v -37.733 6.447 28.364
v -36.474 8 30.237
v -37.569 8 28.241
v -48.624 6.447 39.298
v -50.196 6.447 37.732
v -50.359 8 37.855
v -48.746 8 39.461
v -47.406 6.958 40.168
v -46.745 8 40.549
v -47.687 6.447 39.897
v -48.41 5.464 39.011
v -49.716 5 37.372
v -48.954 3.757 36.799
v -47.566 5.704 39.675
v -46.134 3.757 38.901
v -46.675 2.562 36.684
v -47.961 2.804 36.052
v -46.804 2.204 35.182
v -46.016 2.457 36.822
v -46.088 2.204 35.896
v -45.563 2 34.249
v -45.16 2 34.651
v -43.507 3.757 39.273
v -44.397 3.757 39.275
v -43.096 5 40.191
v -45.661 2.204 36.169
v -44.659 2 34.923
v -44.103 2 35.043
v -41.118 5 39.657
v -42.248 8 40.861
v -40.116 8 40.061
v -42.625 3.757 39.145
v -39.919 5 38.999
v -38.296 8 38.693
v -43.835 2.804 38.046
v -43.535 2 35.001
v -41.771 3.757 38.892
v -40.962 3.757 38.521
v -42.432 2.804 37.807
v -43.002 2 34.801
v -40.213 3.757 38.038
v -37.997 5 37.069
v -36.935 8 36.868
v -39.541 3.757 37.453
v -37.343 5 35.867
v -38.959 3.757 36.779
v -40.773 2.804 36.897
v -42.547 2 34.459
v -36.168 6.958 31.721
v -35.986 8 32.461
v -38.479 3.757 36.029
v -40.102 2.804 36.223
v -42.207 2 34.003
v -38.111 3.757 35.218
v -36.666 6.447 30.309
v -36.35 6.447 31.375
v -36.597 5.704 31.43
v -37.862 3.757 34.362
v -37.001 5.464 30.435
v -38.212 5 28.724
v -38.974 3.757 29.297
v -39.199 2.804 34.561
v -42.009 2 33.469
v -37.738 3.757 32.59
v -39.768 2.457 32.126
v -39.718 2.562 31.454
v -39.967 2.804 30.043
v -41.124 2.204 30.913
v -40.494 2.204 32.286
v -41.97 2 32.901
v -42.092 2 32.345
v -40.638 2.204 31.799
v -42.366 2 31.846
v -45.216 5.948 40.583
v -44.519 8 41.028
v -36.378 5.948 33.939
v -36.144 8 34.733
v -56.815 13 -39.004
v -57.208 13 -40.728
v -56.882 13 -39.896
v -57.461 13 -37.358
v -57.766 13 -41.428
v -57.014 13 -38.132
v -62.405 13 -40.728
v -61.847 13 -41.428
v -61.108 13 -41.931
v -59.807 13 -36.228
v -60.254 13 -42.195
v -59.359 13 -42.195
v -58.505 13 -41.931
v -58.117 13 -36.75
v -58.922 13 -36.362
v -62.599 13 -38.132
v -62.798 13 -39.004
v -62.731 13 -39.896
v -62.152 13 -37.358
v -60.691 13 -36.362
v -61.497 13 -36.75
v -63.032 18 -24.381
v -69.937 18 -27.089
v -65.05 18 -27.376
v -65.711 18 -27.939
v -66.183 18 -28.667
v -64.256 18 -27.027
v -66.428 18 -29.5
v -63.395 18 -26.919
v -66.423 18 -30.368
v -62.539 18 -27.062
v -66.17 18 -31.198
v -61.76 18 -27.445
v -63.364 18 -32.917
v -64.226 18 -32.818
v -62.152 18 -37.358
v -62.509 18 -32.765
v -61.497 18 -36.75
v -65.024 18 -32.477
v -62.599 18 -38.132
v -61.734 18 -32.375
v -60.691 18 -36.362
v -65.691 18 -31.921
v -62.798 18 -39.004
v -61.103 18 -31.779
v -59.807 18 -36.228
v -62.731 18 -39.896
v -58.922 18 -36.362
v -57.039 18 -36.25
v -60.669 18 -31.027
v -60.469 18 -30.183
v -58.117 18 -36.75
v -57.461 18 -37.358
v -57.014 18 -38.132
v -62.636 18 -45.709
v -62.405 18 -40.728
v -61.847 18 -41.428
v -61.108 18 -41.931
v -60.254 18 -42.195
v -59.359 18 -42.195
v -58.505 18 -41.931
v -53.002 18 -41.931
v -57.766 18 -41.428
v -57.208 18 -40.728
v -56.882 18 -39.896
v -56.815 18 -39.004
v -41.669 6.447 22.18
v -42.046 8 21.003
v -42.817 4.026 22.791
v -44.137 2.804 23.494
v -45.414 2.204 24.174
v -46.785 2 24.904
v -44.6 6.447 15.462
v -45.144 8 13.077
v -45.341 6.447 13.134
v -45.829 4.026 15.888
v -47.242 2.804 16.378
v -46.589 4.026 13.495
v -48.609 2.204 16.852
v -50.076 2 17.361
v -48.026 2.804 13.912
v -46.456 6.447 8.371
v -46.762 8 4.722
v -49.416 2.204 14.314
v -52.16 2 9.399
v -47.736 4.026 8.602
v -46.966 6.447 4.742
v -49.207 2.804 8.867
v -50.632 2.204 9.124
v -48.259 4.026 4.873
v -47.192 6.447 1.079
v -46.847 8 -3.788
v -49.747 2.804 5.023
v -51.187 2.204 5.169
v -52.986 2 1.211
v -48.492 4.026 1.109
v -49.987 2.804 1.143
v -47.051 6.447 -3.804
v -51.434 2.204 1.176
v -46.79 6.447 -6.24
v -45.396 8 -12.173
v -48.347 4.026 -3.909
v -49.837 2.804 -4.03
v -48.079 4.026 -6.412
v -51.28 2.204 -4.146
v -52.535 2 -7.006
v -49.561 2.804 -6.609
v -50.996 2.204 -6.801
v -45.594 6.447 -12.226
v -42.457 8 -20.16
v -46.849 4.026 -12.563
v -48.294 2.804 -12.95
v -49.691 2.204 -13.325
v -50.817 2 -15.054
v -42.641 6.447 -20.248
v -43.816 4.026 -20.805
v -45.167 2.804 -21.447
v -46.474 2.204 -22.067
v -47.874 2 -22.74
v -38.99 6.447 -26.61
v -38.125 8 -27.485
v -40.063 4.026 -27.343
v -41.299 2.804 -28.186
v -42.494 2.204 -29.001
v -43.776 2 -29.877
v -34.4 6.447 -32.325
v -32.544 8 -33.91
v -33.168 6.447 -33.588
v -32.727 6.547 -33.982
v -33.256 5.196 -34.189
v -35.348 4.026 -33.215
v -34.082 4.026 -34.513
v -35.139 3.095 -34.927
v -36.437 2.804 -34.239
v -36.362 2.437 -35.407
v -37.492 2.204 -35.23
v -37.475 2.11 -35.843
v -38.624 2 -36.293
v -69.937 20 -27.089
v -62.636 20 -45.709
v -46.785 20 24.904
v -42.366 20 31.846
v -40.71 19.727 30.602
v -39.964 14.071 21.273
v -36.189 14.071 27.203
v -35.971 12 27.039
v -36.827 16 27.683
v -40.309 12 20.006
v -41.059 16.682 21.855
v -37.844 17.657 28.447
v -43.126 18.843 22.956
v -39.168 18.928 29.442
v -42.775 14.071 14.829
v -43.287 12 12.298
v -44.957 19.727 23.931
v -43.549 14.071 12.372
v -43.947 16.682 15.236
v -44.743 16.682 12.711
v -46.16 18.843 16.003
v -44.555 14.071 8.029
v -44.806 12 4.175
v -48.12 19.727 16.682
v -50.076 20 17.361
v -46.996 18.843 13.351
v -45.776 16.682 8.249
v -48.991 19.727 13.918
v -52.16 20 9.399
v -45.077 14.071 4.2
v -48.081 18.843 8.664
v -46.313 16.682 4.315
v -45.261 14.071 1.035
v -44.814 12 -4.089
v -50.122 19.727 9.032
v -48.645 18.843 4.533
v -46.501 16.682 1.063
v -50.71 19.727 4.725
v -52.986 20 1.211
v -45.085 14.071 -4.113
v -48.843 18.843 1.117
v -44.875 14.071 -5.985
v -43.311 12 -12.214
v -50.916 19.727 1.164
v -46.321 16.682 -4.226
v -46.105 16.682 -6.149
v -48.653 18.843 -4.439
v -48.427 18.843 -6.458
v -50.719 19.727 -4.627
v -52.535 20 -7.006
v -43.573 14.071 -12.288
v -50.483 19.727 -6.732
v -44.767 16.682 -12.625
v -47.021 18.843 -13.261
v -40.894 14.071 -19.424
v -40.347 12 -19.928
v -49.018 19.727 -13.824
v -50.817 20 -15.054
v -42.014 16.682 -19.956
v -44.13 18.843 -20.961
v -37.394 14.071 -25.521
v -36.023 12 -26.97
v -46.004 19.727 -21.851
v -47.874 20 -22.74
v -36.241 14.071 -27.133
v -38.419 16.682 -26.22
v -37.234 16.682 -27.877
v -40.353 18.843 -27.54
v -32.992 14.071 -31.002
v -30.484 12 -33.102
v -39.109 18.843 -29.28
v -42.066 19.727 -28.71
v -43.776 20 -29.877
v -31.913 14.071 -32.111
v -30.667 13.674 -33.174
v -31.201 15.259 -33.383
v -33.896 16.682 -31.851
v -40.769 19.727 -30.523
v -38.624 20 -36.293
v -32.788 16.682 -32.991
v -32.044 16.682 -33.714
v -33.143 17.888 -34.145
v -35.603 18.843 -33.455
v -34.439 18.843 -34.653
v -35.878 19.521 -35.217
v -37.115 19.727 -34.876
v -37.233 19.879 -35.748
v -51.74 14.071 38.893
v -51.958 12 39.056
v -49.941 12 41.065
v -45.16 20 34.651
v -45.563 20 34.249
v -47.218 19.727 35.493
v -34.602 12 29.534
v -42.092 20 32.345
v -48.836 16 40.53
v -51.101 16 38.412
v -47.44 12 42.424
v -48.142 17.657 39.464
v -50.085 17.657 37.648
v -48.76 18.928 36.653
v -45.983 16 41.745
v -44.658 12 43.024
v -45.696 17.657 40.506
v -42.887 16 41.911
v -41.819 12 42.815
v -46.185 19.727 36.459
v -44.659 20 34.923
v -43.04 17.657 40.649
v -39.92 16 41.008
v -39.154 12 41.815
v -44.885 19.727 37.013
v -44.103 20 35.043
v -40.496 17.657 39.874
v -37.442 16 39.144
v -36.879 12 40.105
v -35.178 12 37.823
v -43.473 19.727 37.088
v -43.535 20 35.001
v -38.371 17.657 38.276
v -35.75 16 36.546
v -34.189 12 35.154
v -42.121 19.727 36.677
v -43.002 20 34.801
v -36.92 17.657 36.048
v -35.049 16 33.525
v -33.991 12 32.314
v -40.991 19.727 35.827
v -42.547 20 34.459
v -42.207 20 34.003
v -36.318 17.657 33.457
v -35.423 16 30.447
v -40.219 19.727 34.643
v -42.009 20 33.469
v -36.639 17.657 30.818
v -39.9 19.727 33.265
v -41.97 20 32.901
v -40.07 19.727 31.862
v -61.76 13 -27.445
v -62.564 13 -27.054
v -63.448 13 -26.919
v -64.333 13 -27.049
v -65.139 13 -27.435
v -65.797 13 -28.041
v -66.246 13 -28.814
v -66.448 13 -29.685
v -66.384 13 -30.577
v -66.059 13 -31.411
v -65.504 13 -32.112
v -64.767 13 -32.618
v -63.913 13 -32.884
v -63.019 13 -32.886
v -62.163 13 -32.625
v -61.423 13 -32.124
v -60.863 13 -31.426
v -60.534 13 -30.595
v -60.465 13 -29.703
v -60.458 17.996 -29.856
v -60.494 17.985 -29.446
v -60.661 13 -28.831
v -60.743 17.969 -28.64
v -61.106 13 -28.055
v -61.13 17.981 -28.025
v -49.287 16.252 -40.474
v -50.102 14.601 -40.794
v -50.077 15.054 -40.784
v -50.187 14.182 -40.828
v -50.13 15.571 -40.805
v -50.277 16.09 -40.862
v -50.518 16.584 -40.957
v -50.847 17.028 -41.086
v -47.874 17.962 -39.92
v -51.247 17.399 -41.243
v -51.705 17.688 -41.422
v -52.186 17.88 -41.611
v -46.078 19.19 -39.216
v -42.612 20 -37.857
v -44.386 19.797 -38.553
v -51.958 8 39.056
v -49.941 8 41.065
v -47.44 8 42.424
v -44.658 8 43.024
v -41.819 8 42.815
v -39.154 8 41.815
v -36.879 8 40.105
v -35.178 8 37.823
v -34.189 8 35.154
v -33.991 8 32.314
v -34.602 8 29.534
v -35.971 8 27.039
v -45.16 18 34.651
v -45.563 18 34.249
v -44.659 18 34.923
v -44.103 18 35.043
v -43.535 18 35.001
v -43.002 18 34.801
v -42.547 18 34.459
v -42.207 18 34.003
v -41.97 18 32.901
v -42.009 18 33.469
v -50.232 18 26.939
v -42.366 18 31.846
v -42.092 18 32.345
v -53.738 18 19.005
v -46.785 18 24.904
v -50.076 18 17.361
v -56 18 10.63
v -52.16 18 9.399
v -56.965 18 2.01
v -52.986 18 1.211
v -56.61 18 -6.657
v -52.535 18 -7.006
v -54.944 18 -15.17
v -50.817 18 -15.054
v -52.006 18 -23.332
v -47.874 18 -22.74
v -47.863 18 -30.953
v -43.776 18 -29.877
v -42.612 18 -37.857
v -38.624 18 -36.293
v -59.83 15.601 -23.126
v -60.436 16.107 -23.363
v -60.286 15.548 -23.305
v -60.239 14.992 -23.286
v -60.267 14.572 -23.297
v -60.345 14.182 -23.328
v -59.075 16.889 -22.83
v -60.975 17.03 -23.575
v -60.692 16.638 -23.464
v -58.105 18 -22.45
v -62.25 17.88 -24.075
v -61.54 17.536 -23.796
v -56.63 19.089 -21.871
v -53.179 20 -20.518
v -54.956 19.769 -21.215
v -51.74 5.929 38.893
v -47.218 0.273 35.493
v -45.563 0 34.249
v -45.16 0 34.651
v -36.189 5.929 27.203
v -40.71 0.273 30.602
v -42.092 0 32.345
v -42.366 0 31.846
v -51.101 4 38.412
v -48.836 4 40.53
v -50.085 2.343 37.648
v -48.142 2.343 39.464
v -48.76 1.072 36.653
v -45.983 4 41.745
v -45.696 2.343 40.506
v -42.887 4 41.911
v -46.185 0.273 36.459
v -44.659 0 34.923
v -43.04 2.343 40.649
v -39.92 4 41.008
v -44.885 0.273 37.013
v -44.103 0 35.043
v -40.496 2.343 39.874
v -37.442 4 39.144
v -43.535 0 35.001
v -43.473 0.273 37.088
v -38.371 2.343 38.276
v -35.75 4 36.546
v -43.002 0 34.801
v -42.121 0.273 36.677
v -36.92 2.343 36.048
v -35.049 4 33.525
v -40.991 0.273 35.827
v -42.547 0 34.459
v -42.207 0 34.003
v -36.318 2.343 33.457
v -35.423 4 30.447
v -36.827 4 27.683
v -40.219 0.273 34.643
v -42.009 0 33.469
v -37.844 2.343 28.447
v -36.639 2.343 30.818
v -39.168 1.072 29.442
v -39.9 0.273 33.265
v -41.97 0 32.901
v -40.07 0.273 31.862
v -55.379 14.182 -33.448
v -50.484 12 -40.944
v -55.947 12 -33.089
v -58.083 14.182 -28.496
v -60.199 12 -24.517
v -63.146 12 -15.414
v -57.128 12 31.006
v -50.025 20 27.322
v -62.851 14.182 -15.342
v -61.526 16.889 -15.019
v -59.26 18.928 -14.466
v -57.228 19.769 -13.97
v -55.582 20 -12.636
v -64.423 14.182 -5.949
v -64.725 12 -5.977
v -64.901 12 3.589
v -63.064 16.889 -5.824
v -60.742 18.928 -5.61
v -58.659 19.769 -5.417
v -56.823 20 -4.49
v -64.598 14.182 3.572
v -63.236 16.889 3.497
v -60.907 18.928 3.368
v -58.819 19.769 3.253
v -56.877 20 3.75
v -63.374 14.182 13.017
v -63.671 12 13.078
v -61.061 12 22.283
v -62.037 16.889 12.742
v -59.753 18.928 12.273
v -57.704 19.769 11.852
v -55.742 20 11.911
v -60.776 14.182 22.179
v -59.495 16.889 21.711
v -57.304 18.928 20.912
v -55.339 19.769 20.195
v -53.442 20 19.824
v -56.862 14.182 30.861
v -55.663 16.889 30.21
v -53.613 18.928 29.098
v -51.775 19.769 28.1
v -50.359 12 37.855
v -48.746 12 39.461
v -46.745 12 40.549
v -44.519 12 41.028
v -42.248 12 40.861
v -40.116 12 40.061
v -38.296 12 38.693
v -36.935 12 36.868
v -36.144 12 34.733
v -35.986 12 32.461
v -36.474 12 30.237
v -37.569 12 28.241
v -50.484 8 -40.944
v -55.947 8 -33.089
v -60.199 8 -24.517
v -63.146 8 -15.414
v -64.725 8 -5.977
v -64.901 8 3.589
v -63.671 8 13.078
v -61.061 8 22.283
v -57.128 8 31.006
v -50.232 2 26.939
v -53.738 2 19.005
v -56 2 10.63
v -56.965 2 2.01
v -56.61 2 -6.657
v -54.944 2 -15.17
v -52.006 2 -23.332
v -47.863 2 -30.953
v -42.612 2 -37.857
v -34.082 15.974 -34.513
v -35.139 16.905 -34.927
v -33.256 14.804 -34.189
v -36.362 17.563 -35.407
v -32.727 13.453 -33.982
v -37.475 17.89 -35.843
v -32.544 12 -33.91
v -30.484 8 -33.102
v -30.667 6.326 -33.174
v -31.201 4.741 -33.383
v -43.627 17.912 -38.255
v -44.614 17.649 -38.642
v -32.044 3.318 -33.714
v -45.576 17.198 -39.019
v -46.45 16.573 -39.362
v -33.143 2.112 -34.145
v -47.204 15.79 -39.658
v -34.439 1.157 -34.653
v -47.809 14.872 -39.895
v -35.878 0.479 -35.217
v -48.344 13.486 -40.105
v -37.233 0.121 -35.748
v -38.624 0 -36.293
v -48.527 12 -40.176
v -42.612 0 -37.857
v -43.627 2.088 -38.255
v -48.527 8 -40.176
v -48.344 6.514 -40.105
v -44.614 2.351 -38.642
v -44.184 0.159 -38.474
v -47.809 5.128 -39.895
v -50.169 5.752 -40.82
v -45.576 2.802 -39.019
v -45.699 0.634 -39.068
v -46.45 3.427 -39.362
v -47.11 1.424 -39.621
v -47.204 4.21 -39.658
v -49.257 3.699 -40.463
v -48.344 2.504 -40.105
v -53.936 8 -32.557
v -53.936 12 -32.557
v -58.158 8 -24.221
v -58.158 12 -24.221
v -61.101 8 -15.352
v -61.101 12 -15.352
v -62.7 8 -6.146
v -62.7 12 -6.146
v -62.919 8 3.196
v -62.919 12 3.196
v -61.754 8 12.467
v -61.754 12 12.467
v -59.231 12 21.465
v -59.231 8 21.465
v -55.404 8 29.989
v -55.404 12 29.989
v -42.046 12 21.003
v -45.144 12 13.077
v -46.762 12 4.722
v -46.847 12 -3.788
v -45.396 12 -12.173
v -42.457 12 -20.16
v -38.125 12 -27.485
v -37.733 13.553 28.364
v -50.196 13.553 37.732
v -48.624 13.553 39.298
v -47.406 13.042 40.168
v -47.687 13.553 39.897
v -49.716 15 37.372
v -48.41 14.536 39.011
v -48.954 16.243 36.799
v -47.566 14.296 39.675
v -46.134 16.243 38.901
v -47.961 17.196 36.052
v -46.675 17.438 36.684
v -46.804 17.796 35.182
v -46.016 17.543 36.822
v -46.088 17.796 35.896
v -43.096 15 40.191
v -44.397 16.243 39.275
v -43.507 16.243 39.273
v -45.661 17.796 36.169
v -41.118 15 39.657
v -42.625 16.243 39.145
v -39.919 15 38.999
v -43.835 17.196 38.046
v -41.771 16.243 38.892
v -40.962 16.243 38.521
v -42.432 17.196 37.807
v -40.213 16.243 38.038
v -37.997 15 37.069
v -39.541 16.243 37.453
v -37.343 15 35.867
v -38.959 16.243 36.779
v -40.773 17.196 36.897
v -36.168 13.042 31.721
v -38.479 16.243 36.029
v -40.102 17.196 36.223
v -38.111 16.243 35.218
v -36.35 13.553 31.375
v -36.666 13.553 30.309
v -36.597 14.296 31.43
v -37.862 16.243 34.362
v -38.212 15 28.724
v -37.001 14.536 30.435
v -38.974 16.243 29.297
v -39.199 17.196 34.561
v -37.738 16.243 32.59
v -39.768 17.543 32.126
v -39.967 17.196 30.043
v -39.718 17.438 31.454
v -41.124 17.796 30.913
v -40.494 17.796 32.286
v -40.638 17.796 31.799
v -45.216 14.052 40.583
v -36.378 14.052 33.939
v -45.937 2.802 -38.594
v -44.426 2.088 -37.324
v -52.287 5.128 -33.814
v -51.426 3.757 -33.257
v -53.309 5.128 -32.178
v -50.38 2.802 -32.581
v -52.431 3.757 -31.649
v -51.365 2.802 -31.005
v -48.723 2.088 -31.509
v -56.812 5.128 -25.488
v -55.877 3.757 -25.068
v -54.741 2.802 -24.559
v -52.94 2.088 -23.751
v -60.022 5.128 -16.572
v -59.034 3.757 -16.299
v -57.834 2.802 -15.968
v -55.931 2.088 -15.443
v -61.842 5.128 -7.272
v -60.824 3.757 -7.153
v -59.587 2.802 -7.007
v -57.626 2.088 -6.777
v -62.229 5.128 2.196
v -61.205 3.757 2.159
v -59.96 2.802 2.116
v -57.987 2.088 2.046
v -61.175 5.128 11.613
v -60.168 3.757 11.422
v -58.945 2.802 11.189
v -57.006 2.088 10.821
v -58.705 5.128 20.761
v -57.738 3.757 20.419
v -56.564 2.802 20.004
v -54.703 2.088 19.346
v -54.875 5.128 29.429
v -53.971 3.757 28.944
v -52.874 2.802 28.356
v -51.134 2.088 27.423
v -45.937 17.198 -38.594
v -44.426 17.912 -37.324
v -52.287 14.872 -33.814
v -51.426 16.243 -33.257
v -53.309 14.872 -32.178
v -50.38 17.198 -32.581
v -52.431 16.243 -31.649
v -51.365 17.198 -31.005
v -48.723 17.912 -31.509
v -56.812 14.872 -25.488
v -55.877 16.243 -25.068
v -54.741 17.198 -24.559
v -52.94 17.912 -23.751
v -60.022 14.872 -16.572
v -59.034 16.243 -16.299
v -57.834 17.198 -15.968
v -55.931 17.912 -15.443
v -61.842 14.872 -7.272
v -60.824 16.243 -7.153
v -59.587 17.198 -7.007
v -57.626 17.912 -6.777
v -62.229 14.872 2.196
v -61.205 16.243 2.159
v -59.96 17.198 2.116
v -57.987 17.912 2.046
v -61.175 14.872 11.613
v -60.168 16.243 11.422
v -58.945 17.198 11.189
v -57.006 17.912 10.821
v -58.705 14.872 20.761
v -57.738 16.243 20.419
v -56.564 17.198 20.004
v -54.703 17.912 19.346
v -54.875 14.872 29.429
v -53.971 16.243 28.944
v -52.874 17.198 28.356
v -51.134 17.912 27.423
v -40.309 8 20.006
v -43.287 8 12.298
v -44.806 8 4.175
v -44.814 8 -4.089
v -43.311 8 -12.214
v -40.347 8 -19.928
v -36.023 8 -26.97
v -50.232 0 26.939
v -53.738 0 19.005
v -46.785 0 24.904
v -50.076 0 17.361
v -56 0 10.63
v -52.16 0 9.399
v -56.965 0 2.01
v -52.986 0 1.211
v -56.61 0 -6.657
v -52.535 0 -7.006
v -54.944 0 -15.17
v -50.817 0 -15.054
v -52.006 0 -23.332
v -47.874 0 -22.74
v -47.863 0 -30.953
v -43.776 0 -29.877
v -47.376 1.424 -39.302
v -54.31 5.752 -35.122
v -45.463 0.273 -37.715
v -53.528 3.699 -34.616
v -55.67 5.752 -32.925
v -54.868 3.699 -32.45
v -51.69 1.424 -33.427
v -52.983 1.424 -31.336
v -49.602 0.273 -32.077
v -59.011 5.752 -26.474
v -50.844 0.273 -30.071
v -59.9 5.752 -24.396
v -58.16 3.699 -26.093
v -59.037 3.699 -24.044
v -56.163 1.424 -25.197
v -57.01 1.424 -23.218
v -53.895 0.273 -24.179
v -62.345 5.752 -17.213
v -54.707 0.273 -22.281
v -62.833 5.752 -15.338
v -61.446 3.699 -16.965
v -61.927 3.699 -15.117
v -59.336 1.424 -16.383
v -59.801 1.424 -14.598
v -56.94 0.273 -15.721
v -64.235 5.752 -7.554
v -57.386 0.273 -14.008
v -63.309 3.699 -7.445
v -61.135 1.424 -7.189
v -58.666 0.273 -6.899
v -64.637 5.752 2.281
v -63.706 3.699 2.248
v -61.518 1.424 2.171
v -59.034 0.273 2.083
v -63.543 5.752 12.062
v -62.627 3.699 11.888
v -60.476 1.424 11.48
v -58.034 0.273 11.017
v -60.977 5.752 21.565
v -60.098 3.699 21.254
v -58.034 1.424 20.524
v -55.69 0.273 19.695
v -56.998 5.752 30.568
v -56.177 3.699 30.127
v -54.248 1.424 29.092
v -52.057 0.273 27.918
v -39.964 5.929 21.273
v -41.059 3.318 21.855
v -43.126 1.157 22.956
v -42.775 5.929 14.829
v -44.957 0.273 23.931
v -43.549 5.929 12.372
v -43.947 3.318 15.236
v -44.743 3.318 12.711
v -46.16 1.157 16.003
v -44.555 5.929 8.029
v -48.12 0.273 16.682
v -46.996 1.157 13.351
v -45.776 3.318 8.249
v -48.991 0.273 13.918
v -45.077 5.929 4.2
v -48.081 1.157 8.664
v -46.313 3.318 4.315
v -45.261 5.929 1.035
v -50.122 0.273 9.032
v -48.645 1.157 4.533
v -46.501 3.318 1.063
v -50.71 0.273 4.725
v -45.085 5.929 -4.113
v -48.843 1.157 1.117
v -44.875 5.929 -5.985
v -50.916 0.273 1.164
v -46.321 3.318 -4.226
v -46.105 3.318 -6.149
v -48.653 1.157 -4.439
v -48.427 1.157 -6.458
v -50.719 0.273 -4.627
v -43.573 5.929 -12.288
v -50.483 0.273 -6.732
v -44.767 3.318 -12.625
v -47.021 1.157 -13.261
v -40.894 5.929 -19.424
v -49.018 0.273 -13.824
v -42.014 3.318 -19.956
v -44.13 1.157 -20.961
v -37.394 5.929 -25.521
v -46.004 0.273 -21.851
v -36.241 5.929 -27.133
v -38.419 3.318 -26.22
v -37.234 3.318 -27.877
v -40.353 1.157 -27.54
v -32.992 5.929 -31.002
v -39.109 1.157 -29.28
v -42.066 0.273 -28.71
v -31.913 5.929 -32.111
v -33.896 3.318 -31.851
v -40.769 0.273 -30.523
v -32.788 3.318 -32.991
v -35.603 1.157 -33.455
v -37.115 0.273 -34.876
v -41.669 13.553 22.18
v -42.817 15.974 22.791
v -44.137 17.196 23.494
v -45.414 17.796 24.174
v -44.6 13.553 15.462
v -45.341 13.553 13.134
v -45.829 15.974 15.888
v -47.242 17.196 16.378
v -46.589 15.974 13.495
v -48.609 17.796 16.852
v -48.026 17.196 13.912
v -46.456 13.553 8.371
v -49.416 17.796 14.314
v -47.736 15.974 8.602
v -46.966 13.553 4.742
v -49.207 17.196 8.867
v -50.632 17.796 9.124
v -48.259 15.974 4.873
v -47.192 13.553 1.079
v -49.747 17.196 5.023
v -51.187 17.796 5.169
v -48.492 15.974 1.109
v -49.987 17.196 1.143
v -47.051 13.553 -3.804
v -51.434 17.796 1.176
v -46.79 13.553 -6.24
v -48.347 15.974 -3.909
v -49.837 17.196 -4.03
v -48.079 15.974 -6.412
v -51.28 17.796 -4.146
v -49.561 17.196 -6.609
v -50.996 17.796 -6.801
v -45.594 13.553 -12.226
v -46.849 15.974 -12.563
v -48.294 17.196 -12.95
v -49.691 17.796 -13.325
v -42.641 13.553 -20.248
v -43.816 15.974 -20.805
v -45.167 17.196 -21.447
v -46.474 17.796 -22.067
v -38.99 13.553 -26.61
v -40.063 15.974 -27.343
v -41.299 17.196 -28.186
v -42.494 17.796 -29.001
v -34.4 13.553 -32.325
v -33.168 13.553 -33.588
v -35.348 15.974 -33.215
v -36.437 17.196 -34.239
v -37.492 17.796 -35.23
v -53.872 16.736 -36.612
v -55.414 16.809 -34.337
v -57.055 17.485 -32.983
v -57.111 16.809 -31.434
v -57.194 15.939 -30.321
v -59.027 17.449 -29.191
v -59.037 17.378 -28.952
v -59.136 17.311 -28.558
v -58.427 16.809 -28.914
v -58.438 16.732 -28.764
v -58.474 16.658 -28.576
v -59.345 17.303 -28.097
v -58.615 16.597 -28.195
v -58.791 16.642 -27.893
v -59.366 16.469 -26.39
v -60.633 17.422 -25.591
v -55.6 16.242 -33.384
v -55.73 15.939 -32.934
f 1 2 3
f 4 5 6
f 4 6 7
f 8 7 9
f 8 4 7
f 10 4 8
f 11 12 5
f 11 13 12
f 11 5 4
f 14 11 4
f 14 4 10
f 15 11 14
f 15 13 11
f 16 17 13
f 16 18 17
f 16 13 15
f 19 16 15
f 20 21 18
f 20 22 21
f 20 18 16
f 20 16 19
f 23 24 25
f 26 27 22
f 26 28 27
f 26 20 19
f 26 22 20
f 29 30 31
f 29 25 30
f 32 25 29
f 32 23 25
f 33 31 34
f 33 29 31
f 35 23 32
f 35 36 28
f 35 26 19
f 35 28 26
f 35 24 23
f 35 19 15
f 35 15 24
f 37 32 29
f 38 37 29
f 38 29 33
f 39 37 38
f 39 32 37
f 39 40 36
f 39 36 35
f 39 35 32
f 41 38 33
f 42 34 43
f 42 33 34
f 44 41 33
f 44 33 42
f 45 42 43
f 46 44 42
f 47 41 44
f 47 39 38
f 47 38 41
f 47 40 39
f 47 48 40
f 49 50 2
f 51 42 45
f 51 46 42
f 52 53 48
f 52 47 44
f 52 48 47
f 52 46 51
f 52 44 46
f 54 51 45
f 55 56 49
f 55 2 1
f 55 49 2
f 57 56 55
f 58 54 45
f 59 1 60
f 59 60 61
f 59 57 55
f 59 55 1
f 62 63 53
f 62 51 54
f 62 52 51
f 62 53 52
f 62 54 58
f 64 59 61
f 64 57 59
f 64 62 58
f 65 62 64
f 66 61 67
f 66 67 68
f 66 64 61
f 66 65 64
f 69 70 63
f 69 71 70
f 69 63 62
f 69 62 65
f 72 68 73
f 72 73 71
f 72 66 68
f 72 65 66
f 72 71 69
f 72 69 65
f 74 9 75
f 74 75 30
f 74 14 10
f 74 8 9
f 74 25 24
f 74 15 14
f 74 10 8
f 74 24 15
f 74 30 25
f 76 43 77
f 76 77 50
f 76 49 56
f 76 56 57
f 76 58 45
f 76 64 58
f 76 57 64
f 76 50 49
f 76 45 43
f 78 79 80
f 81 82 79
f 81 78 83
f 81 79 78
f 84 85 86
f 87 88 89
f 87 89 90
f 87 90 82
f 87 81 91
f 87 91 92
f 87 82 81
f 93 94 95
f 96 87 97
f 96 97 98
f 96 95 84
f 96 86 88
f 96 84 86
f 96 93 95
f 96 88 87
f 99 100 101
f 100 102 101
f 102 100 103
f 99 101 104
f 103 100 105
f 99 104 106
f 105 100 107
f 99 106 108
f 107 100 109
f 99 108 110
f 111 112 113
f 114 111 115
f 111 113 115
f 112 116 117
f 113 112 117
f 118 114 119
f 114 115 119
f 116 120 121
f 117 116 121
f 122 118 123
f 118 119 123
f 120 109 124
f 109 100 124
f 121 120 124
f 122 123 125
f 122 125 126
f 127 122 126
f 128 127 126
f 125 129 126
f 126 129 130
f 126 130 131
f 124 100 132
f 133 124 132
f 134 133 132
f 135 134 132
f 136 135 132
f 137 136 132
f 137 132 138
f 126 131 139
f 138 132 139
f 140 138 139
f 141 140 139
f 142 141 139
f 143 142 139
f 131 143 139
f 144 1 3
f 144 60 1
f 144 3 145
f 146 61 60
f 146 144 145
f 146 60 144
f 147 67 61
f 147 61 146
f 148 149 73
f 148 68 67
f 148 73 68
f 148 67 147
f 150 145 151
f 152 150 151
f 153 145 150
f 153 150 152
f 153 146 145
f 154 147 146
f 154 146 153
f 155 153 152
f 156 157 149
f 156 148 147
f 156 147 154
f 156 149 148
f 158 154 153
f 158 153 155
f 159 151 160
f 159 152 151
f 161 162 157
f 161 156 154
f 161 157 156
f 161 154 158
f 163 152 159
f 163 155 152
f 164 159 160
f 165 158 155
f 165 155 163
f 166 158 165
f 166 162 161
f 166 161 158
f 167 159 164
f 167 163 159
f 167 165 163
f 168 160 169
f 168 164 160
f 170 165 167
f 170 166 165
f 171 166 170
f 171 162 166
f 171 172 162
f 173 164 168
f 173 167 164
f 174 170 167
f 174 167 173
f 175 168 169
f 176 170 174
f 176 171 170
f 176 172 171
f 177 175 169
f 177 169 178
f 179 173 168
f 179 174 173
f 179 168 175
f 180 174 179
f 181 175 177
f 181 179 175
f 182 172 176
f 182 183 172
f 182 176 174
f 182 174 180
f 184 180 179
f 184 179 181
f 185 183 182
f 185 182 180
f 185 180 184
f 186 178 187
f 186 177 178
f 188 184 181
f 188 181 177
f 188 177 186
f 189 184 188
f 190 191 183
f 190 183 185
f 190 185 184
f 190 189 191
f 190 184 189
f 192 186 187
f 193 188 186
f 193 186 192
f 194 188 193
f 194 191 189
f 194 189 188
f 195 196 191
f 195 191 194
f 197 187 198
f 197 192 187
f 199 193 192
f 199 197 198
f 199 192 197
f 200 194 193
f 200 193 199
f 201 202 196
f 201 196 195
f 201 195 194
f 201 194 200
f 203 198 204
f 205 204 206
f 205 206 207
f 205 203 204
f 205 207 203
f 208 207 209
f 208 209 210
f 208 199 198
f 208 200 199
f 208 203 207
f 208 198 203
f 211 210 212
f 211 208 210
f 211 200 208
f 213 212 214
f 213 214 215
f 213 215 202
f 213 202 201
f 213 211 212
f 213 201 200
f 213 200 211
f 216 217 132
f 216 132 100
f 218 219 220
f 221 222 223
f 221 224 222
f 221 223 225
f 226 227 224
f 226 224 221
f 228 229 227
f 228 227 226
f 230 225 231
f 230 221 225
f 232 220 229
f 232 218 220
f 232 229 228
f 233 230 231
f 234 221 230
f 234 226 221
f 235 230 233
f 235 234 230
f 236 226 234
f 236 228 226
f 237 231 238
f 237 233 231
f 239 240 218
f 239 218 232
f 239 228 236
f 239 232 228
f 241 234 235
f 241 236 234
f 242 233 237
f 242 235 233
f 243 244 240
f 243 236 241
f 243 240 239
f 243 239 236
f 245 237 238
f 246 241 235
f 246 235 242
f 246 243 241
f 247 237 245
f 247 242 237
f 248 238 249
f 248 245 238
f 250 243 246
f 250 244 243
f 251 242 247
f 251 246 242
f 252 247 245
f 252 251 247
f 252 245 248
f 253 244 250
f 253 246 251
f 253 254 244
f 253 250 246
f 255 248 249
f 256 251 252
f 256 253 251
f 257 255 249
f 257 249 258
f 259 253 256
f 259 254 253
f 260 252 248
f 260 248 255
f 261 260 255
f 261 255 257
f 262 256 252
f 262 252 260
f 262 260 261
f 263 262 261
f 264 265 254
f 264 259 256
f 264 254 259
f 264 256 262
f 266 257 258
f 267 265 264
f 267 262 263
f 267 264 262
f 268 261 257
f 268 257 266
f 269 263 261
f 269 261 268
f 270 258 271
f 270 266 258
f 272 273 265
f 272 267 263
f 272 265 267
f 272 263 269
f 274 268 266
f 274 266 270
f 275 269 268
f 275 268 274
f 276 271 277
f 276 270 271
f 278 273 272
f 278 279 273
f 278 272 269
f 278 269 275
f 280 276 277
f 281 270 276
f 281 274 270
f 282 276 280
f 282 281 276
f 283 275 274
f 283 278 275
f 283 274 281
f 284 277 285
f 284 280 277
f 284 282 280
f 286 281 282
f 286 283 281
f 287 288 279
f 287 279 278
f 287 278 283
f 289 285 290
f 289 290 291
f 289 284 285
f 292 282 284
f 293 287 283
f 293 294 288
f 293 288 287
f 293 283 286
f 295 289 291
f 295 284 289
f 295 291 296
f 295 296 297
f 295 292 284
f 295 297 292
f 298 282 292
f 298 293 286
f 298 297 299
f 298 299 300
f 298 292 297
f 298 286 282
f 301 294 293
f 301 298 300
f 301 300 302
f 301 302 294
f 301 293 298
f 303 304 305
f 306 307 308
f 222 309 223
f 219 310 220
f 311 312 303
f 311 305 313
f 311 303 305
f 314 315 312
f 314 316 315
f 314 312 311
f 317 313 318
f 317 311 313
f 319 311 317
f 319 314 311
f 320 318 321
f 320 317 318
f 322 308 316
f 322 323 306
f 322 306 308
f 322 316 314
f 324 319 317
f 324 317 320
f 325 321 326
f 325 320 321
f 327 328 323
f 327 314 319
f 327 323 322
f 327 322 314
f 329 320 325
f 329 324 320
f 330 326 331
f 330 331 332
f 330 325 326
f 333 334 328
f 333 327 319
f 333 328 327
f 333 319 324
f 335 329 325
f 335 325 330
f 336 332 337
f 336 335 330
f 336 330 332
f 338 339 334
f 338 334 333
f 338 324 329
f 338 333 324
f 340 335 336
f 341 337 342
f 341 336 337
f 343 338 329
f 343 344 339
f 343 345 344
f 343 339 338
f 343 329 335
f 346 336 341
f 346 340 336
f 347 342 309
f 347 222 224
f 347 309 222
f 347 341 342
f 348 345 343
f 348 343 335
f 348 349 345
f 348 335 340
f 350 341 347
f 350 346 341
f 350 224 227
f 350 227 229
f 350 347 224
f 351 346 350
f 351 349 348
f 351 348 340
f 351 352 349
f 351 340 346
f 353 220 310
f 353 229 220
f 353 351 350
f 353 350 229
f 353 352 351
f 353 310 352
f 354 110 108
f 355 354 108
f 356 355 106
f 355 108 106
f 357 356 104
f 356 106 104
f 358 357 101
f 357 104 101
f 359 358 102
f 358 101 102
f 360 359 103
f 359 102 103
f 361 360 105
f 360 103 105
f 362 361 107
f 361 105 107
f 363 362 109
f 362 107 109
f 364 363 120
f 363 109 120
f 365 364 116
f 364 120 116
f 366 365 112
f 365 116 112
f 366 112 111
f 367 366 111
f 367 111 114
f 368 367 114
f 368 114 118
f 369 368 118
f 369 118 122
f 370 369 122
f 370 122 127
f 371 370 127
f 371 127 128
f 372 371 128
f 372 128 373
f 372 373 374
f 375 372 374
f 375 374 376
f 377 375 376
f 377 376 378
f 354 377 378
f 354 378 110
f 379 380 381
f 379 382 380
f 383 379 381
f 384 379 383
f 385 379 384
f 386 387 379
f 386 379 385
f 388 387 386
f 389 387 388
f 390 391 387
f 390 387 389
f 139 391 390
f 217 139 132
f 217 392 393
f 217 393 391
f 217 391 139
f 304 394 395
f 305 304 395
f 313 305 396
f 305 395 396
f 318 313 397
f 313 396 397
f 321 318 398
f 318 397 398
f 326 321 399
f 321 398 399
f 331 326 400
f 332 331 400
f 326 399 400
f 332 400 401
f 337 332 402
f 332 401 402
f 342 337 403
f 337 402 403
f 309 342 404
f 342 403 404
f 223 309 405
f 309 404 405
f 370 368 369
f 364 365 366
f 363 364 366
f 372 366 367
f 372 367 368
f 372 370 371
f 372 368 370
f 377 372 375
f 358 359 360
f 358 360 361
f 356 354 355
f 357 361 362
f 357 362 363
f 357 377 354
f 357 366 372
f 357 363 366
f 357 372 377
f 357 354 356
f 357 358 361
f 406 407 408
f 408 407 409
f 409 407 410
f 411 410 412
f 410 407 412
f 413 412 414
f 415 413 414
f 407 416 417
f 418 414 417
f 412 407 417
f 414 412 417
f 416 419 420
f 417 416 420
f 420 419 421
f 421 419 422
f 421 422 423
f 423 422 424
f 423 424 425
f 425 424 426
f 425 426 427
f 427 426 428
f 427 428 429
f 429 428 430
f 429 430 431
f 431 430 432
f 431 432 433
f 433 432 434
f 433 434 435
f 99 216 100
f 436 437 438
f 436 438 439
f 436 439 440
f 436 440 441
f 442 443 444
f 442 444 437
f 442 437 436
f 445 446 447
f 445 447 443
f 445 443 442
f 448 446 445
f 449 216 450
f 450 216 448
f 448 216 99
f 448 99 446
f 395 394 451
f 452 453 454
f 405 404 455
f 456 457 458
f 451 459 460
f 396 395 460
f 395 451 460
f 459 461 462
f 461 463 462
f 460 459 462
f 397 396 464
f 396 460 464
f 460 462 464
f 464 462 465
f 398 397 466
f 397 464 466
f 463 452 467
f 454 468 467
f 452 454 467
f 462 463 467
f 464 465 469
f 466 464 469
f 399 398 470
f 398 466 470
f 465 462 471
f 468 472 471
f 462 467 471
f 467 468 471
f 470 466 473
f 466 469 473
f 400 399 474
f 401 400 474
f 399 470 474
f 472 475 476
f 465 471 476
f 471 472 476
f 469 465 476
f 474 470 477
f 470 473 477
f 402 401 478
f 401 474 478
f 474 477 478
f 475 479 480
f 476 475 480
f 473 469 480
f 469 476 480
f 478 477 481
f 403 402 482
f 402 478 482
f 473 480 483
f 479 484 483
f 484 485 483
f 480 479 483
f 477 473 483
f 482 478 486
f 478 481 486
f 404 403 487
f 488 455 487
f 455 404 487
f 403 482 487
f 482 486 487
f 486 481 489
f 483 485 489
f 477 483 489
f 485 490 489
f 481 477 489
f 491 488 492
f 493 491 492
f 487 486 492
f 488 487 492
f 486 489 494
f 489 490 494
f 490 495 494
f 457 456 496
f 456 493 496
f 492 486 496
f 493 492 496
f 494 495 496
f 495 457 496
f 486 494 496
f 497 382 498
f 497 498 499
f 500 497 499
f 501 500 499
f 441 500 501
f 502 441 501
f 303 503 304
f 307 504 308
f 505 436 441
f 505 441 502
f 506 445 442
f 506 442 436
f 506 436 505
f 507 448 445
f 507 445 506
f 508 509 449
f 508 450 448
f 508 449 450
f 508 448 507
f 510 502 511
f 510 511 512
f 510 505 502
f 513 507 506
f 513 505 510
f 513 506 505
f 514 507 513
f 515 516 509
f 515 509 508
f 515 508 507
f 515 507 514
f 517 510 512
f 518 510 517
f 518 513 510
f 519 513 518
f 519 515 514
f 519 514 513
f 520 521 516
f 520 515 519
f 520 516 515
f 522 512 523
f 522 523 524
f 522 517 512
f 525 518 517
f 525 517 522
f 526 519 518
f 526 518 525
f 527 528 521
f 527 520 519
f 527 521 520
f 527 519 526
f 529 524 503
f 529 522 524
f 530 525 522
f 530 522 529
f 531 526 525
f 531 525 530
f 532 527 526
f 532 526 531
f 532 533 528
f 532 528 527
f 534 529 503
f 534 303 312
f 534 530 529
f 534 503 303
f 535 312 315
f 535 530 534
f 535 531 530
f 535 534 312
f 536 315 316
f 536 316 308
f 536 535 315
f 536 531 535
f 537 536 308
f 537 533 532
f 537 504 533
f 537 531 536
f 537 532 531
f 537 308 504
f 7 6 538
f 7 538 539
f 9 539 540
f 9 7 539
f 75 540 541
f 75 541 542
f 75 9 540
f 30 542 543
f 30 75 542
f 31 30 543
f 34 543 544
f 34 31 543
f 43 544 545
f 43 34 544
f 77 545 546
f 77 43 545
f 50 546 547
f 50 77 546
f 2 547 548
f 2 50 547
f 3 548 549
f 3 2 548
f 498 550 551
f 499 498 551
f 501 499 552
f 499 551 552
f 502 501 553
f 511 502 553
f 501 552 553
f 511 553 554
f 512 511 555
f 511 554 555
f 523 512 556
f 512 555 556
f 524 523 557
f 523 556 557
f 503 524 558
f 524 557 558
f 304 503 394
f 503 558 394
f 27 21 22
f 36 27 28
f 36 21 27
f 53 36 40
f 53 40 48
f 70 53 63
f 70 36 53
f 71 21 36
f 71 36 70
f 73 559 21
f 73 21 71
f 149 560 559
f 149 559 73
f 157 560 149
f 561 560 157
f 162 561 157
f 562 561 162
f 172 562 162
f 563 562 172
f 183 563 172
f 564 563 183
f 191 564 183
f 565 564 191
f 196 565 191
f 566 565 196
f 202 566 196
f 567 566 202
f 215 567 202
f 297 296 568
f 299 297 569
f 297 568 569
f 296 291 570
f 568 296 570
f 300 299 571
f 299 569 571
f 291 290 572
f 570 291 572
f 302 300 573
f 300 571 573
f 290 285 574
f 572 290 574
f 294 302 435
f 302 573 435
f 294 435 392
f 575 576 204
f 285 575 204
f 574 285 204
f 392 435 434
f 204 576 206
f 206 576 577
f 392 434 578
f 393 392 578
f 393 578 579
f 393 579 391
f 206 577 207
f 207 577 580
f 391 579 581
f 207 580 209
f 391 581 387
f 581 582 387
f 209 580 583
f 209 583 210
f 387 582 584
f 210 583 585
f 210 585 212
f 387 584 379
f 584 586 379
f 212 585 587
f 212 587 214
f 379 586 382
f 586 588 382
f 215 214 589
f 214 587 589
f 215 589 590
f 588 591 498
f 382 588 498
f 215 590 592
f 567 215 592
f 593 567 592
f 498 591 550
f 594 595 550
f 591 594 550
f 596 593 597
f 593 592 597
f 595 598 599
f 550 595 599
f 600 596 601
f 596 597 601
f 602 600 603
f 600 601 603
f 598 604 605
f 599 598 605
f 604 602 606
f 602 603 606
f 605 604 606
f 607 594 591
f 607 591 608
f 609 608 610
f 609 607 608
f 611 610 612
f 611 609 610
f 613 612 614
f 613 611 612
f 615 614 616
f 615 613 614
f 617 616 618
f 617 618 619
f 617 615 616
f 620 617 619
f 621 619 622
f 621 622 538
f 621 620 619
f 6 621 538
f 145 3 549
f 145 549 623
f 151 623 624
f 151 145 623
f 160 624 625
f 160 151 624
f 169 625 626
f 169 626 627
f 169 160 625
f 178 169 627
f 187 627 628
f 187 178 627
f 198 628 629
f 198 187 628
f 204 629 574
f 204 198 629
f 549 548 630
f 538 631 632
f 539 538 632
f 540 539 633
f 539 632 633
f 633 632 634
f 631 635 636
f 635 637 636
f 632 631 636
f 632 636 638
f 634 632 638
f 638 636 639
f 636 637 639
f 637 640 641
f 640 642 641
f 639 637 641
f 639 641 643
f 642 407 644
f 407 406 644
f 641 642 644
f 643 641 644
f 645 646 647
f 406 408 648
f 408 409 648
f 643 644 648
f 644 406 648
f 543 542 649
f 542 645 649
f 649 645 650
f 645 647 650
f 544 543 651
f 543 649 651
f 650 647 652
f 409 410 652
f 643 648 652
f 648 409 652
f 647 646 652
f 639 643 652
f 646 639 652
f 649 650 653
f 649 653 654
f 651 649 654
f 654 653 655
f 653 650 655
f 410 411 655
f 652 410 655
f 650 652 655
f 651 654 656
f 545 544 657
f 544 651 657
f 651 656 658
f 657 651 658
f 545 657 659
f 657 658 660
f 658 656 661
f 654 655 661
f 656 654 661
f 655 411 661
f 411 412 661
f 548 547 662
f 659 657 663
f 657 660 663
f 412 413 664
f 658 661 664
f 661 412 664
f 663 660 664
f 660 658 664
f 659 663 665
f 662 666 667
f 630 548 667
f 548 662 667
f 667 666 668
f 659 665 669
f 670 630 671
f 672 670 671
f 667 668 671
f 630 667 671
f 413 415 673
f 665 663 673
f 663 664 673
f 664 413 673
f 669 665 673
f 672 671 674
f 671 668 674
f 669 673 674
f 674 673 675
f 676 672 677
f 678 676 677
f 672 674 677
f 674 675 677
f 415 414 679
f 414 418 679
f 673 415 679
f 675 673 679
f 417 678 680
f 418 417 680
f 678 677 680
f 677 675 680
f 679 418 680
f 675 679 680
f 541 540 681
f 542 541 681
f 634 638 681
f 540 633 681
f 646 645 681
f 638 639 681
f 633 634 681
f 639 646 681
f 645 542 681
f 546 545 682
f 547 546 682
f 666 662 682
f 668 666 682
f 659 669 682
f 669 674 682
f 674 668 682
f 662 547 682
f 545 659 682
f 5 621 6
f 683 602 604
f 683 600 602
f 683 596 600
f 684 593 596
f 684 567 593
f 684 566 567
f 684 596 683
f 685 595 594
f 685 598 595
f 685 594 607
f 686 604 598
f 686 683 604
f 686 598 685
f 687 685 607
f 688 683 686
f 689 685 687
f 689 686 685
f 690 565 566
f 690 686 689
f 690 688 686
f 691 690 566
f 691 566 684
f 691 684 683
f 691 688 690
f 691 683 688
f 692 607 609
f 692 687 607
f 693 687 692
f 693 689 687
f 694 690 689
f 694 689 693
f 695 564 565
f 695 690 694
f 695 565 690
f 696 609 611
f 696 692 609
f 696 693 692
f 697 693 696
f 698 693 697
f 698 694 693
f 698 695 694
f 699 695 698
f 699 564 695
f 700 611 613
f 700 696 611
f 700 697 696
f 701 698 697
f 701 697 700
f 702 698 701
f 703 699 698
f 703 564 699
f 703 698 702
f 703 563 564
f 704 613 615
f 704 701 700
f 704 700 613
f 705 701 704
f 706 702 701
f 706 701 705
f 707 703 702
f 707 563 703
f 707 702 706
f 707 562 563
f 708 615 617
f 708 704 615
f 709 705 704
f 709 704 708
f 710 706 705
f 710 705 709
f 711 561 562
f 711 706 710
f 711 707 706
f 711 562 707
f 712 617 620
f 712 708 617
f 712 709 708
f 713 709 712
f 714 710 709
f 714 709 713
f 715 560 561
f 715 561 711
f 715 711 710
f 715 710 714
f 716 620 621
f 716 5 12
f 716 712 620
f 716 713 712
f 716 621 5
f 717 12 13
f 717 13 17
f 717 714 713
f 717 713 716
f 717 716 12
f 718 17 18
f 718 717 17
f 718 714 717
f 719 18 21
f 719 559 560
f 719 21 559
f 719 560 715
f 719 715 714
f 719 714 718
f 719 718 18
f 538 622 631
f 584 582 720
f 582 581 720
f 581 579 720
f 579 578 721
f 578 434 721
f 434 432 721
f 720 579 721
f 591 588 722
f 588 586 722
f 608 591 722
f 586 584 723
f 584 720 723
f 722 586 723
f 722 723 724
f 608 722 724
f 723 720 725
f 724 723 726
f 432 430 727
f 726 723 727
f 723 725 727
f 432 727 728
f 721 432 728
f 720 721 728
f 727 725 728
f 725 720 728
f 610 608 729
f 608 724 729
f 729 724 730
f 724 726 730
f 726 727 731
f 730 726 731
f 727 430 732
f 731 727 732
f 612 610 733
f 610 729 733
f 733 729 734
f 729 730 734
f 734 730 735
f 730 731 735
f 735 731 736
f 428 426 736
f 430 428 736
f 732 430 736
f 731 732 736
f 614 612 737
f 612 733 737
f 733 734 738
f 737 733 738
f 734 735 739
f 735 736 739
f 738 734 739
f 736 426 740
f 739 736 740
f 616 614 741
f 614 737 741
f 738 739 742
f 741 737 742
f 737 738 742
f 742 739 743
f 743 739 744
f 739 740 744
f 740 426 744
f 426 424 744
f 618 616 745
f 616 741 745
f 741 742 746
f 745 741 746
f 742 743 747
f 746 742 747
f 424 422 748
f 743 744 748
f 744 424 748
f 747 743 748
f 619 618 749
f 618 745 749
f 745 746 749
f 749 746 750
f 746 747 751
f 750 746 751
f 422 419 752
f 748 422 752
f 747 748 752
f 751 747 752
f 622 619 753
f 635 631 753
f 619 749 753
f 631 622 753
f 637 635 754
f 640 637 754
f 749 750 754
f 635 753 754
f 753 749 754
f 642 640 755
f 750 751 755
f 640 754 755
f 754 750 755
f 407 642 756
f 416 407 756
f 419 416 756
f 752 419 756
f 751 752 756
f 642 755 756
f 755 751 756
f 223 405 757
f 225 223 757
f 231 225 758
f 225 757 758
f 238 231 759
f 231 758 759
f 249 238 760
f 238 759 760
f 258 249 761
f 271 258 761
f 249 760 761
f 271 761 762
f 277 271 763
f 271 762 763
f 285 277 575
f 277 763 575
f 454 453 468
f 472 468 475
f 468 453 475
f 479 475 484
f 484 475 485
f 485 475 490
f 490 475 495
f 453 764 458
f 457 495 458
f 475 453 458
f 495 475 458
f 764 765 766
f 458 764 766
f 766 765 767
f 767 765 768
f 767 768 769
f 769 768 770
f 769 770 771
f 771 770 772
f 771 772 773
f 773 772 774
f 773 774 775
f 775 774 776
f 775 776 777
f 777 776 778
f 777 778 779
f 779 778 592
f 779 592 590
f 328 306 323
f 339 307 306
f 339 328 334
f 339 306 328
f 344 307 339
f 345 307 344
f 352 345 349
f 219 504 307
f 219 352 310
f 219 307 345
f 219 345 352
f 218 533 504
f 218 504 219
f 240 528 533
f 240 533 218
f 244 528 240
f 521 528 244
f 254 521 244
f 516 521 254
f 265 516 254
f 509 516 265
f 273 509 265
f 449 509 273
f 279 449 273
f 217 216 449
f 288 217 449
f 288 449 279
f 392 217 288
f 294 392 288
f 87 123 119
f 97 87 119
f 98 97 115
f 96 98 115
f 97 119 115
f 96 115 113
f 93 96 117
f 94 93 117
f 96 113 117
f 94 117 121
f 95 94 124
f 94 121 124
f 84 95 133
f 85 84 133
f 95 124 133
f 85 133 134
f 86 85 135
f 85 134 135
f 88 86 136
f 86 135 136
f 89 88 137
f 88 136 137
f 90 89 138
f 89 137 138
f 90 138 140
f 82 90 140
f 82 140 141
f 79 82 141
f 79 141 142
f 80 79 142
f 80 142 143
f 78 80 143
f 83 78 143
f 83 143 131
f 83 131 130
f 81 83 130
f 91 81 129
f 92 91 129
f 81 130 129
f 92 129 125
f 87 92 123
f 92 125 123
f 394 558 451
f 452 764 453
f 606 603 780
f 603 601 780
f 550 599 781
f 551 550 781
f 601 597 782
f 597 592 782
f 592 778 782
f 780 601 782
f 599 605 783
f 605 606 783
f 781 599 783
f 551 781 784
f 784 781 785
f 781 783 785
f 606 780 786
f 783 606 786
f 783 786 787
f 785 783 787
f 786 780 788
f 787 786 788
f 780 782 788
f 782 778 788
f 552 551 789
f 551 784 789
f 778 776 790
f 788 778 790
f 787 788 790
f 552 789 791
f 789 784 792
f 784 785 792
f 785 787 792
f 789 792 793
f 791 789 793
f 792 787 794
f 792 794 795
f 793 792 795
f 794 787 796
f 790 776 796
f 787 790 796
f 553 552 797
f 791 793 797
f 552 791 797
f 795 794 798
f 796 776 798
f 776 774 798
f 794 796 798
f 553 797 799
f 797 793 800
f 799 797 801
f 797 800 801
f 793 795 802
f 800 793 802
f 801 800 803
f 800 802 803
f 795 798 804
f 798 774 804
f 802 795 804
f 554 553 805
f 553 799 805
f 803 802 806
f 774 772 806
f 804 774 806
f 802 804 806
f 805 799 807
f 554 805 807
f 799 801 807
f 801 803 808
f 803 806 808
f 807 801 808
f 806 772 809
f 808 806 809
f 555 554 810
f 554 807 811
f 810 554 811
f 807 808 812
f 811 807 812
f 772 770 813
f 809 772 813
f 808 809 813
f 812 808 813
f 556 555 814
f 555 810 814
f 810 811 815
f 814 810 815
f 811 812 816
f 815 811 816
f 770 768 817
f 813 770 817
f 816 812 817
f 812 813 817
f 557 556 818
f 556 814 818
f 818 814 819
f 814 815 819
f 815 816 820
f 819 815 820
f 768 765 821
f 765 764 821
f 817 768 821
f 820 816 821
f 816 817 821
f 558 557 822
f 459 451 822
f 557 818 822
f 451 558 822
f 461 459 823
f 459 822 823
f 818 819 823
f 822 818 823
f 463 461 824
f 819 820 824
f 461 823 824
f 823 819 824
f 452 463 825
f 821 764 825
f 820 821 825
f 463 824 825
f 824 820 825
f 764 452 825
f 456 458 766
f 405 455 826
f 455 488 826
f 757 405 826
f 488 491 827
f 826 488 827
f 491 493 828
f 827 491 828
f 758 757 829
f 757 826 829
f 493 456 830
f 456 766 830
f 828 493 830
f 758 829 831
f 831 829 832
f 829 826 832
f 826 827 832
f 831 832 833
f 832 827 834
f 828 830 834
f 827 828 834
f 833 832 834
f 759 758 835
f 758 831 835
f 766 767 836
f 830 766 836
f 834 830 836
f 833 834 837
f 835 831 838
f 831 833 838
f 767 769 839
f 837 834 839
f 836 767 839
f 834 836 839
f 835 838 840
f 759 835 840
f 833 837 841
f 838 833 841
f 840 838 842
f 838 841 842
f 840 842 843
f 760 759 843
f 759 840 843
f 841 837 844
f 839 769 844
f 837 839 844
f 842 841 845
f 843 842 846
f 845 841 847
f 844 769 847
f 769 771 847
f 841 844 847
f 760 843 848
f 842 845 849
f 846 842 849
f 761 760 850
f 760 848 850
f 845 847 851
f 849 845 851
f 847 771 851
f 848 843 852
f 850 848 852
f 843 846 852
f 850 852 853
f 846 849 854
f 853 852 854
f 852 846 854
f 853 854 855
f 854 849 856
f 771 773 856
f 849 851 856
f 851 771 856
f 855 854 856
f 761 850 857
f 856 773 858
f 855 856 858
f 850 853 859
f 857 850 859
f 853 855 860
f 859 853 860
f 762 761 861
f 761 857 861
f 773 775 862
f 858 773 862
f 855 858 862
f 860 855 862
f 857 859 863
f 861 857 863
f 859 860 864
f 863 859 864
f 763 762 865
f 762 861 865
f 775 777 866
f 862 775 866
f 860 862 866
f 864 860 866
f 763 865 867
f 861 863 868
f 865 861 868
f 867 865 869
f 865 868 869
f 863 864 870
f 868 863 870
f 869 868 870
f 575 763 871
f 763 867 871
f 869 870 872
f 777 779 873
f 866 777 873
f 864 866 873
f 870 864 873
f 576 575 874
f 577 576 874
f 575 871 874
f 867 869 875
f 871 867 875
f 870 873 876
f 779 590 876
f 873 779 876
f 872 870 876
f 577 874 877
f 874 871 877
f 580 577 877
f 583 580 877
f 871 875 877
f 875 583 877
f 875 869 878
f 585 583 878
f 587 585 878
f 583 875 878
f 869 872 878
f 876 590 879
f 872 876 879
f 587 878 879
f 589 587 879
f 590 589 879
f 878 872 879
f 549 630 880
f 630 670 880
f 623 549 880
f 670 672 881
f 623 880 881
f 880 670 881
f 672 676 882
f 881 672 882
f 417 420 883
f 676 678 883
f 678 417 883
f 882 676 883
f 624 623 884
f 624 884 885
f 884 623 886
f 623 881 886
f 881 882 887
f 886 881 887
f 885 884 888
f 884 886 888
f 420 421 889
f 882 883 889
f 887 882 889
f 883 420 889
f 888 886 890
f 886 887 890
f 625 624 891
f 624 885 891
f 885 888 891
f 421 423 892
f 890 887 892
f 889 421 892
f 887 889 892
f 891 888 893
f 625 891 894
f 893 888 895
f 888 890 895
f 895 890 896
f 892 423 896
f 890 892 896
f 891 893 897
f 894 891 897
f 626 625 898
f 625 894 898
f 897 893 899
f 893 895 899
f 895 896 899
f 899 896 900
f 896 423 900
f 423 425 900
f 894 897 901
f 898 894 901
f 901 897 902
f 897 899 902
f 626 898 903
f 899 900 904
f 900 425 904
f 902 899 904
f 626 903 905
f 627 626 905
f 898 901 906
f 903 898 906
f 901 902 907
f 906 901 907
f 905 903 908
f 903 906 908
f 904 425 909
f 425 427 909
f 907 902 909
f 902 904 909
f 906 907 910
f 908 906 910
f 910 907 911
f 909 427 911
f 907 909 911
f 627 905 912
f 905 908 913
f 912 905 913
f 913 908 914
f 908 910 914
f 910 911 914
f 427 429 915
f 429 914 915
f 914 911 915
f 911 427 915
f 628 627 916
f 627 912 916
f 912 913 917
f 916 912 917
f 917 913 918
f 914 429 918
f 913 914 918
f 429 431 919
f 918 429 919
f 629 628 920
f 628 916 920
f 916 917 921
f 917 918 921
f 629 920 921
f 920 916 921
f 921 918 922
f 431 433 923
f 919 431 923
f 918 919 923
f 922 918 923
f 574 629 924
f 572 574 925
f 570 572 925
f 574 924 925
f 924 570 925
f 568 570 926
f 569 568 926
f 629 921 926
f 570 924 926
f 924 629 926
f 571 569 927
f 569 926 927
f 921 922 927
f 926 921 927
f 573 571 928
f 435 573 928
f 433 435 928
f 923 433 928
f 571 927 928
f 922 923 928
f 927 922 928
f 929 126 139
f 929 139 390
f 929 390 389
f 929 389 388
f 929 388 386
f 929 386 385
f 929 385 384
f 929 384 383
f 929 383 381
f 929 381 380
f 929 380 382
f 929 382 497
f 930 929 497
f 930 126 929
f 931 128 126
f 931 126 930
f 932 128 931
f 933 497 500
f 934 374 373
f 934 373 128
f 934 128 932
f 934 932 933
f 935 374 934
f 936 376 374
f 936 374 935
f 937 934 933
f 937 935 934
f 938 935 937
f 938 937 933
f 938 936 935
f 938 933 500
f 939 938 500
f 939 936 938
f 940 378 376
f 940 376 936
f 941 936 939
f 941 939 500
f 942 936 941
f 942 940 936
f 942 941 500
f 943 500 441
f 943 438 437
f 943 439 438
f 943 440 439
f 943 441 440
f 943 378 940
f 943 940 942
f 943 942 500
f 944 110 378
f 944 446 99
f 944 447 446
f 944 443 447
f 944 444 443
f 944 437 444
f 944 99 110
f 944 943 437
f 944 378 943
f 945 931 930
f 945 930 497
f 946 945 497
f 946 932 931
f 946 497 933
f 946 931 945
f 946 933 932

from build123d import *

# Parameters (mm, degrees)
BOSS_EXTRUDE1_DEPTH = 20
FILLET4_R           = 8
SHELL4_T            = -2
BOSS_EXTRUDE3_DEPTH = 2
FILLET5_R           = 3
SKETCH4_R           = 3
BOSS_EXTRUDE4_DEPTH = 5


with BuildPart() as part:
    # Sketch1 → Boss-Extrude1 (new body)
    with BuildSketch(Plane(origin=(0, 0, 0), x_dir=(1, 0, 0), z_dir=(0, 1, 0))):
        with BuildLine():
            Line((-30.483789425, 33.101942273), (-50.483789425, 40.943705319))
            ThreePointArc((-50.483789425, 40.943705319), (-64.988970557, 1.197374595), (-51.957731338, -39.056294681))
            ThreePointArc((-51.957731338, -39.056294681), (-37.955573489, -41.04113109), (-35.97073708, -27.038973241))
            ThreePointArc((-35.97073708, -27.038973241), (-44.813875675, 4.088587411), (-30.483789425, 33.101942273))
        make_face()
    extrude(amount=BOSS_EXTRUDE1_DEPTH)

    # Fillet4
    fillet4_edges = [part.edges().sort_by_distance(p)[0] for p in [
        (-44.813875675, 20, -4.088587411),
        (-64.988970557, 20, -1.197374595),
        (-44.813875675, 0, -4.088587411),
        (-37.955573489, 0, 41.04113109),
        (-64.988970557, 0, -1.197374595),
        (-37.955573489, 20, 41.04113109),
    ]]
    fillet(fillet4_edges, radius=FILLET4_R)

    # Shell4
    shell4_openings = [part.faces().sort_by_distance(p)[0] for p in [
        (-40.508625428, 10, -37.032561699),
    ]]
    offset(amount=SHELL4_T, openings=shell4_openings, kind=Kind.INTERSECTION)

    # Sketch2 → Boss-Extrude3 (add)
    with BuildSketch(Plane(origin=(0, 20, 0), x_dir=(1, 0, 0), z_dir=(0, 1, 0))):
        Polygon((-39.36151224, 36.582792208), (-62.636385717, 45.708594344), (-69.937027426, 27.088695563), (-51.317128644, 19.788053854), align=None)
    extrude(amount=-BOSS_EXTRUDE3_DEPTH)

    # Fillet5
    fillet5_edges = [part.edges().sort_by_distance(p)[0] for p in [
        (-53.682873098, 18, -31.597158652),
    ]]
    fillet(fillet5_edges, radius=FILLET5_R)

    # Sketch4 → Boss-Extrude4 (add)
    with BuildSketch(Plane.XZ.offset(-18)):
        with Locations(Location((-59.806571448, -39.228459222, 0), (0, 0, 90))):
            Circle(SKETCH4_R)
        with Locations(Location((-63.456892303, -29.918509831, 0), (0, 0, 55.543794566))):
            Circle(SKETCH4_R)
    extrude(amount=BOSS_EXTRUDE4_DEPTH)


solid = part.part
